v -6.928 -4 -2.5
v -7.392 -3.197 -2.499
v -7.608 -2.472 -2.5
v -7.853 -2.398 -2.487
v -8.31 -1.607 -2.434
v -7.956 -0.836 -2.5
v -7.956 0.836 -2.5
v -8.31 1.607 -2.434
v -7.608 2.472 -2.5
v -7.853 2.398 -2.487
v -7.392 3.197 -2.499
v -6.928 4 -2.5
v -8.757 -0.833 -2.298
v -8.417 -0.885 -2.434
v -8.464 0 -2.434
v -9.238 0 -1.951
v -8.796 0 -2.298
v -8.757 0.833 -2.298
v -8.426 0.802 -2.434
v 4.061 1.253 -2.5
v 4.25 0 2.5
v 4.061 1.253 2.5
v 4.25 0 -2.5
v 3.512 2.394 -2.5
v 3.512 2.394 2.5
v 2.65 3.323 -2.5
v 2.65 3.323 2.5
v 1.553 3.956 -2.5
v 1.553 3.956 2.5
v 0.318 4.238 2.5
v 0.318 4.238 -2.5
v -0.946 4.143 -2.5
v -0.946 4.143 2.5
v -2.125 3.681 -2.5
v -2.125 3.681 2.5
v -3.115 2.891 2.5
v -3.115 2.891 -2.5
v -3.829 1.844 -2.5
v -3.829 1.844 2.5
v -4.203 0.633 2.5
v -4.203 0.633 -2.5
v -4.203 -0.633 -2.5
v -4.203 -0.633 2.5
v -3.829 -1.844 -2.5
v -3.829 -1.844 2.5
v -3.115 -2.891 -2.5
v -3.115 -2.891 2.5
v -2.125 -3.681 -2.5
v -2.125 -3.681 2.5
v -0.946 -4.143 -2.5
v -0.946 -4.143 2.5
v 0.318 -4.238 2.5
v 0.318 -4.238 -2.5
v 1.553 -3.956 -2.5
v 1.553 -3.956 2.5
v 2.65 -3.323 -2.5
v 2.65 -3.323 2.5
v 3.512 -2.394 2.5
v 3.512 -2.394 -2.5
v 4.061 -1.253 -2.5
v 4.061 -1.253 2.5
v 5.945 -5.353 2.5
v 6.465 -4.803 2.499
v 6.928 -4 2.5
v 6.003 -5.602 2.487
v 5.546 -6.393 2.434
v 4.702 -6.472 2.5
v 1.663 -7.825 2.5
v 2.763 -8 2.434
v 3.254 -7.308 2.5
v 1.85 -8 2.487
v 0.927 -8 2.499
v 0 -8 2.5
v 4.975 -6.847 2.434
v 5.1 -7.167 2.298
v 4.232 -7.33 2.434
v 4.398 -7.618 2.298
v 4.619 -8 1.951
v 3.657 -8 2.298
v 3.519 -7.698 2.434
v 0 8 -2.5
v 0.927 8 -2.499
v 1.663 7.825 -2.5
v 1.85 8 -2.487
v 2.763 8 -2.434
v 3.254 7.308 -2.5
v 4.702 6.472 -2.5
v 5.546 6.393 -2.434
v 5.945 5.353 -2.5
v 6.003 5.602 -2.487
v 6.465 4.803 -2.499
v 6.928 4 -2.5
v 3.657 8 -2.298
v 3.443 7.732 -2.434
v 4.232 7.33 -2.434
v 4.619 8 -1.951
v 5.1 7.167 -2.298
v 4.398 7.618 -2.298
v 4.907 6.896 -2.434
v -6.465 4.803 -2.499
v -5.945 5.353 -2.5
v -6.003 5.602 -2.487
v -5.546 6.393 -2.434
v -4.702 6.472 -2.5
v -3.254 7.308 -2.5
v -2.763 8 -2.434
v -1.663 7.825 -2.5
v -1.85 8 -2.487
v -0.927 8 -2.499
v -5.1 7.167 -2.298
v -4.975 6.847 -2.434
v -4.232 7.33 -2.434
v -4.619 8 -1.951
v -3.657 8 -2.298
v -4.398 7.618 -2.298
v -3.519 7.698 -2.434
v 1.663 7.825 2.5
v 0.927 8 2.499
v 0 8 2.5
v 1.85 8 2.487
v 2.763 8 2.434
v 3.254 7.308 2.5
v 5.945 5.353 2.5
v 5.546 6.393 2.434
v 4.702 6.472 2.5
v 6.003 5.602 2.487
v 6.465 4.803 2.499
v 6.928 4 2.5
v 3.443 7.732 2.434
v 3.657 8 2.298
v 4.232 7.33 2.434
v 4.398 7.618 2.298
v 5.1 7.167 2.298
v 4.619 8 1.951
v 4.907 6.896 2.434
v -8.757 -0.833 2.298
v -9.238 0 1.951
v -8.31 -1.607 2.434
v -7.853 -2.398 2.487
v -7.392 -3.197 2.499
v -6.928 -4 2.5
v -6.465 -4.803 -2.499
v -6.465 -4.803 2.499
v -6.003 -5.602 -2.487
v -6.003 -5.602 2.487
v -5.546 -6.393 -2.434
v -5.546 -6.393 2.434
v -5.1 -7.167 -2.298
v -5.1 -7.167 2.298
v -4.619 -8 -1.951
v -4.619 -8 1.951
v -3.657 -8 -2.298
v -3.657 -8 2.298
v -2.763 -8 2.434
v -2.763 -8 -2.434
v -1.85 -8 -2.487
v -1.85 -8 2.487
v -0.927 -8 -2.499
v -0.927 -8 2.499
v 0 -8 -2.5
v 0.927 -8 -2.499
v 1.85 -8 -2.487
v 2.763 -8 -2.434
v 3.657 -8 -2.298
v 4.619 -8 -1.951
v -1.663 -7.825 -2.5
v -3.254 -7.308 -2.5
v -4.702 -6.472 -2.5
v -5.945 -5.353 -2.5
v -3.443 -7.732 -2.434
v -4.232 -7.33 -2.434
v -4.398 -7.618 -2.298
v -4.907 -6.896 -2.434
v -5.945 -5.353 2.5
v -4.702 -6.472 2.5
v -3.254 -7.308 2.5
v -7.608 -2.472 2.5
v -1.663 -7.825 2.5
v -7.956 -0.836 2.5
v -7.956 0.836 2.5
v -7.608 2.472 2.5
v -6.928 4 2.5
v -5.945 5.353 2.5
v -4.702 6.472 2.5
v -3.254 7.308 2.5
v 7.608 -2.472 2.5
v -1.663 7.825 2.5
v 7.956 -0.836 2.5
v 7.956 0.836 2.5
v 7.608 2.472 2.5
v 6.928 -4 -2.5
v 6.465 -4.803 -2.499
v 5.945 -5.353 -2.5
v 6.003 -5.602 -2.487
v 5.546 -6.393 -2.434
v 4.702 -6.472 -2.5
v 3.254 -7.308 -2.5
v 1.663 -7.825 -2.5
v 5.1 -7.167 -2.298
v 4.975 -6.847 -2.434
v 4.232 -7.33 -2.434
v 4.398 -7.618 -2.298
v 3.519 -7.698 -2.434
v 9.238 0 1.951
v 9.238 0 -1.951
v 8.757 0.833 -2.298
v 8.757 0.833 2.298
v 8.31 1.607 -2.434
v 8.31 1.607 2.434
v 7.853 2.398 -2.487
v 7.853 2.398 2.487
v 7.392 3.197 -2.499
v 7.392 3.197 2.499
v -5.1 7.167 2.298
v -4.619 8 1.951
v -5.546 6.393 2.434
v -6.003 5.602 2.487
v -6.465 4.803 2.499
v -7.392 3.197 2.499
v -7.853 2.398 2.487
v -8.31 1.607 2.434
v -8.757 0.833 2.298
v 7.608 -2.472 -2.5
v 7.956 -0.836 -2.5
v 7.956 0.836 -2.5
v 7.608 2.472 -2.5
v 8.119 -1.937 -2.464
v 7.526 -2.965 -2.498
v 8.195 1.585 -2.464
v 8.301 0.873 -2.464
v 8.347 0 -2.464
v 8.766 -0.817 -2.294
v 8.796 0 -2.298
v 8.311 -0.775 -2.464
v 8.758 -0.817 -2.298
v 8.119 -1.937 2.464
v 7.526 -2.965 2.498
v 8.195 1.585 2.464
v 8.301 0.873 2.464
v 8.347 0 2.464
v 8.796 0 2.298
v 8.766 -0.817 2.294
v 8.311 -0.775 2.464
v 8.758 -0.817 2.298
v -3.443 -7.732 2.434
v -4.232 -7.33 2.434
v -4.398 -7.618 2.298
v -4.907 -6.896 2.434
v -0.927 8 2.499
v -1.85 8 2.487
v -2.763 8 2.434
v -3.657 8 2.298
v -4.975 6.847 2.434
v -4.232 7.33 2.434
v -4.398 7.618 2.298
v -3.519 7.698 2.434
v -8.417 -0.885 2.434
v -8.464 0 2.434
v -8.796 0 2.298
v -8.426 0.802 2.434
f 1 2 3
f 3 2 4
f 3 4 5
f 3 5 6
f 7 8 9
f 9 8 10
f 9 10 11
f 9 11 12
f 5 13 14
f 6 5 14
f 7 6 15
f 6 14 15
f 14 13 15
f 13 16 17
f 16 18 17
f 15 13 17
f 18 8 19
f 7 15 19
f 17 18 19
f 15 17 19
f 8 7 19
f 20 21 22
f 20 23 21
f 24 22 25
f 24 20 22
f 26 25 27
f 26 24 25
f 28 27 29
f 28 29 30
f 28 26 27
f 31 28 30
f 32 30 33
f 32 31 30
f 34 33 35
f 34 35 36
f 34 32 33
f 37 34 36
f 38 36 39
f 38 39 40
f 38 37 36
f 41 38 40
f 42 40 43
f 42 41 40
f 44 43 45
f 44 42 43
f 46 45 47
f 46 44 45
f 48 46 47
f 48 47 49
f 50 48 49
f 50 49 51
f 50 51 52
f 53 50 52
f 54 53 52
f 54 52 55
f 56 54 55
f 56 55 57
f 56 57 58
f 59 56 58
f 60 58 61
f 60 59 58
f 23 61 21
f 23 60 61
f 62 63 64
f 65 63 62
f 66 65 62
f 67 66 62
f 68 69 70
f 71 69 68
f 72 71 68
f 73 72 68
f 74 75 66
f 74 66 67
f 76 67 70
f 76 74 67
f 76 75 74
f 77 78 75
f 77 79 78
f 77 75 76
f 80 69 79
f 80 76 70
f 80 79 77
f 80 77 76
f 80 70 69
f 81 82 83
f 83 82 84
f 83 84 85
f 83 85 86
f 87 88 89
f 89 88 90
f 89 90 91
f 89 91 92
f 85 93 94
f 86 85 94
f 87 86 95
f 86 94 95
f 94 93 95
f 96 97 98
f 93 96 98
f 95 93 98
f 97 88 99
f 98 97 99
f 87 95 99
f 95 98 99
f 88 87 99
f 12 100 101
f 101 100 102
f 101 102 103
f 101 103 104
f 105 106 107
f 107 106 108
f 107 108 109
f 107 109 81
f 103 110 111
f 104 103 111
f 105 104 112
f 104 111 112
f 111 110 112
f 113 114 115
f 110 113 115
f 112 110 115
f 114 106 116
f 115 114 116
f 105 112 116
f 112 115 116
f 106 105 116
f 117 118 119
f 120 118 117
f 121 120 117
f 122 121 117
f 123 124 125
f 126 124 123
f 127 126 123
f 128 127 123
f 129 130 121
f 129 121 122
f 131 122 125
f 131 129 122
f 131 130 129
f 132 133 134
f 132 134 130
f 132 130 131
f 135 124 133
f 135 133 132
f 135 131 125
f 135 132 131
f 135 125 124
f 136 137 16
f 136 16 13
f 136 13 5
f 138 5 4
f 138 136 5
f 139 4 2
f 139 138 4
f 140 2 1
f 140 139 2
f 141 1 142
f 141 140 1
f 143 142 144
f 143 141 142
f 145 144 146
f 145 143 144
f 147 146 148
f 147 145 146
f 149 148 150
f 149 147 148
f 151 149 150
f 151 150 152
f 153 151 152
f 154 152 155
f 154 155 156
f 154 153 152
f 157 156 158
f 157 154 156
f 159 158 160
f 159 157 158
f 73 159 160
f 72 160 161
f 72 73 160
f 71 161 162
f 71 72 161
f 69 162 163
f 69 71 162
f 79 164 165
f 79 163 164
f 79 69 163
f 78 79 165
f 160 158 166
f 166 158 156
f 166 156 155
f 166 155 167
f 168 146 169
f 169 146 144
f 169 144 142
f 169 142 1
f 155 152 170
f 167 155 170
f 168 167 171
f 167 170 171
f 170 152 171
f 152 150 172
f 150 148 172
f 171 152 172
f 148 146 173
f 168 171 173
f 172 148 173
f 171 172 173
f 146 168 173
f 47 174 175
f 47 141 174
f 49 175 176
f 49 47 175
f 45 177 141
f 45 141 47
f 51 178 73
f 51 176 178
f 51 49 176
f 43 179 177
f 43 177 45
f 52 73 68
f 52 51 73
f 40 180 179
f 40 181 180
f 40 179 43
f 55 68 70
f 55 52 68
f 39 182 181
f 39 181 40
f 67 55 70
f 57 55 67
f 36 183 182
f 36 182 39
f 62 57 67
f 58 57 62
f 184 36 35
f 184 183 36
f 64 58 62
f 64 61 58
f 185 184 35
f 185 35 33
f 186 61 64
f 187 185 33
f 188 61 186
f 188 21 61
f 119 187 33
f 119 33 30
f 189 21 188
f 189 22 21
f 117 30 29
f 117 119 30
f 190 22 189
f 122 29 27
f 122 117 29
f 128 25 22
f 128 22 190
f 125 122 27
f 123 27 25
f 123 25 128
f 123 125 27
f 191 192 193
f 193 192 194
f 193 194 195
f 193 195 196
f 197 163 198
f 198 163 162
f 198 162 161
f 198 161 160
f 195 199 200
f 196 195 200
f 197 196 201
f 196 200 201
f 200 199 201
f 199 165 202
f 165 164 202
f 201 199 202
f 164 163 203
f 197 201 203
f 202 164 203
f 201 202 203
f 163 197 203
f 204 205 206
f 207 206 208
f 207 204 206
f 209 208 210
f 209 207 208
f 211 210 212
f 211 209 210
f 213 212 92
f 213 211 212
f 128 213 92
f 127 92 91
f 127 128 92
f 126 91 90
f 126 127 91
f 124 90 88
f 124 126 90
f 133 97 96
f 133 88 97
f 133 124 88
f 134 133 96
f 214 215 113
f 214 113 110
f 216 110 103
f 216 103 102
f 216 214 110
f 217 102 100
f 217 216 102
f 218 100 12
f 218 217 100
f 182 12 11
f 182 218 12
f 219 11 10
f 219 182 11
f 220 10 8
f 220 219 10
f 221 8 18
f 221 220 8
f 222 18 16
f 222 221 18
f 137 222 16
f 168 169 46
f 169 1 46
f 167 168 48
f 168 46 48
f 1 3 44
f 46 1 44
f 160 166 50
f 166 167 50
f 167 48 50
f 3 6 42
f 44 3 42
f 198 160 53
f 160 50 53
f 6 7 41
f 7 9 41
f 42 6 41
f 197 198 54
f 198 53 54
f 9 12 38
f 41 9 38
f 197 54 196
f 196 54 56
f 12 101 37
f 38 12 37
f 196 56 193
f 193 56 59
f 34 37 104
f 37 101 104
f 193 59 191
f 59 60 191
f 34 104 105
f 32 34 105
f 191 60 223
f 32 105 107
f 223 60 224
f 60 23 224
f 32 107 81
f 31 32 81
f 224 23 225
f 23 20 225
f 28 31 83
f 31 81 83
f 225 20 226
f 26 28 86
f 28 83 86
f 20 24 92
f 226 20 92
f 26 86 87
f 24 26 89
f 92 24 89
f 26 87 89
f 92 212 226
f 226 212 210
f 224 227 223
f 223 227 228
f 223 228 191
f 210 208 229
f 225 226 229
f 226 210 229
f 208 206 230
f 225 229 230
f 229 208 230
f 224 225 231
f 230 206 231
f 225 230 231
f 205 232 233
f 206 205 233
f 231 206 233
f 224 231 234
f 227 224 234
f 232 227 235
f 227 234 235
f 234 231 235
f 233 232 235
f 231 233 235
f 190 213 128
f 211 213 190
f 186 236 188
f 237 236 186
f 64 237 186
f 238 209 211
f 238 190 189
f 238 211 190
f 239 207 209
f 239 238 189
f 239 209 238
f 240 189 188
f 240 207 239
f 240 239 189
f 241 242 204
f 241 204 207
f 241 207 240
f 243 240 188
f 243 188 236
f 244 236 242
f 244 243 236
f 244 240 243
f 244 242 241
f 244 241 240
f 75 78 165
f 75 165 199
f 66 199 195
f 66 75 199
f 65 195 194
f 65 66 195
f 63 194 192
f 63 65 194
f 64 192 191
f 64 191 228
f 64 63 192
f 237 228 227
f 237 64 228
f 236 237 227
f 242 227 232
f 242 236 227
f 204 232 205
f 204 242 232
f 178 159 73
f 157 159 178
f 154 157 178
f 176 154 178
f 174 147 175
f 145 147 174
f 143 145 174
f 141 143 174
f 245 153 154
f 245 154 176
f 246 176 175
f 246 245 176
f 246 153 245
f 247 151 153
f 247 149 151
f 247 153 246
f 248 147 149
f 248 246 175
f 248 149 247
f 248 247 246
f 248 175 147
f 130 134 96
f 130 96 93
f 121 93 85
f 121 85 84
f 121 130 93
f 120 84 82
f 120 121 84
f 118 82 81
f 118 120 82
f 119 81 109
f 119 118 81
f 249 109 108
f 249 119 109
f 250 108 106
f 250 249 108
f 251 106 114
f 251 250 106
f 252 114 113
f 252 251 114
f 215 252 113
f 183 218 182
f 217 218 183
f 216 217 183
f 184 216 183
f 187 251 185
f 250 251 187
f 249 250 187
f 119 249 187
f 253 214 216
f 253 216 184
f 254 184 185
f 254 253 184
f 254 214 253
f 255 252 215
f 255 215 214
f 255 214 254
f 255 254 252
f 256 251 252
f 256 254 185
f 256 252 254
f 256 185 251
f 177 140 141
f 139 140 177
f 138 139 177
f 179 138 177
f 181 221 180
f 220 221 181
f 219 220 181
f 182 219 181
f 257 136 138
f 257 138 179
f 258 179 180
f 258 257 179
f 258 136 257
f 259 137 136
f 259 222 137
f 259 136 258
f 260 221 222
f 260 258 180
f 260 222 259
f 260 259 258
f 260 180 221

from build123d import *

# Parameters (mm, degrees)
ESQUISSE1_R        = 4.25
BOSS_EXTRU_1_DEPTH = 2.5


with BuildPart() as part:
    # Esquisse1 → Boss.-Extru.1 (new body, symmetric)
    with BuildSketch(Plane.XY):
        Polygon((-4.618802154, -8), (4.618802154, -8), (9.237604307, 0), (4.618802154, 8), (-4.618802154, 8), (-9.237604307, 0), align=None)
        Circle(ESQUISSE1_R, mode=Mode.SUBTRACT)
    extrude(amount=BOSS_EXTRU_1_DEPTH, both=True)

    # Esquisse3 → Enlèvement de matière-Révolution2 (revolve, cut)
    with BuildSketch(Plane(origin=(0, 0, 0), x_dir=(0, 0, -1), z_dir=(1, 0, 0)), mode=Mode.PRIVATE) as enl_vement_de_mati_re_r_volution2_sk:
        with BuildLine():
            Line((3, 10.101429963), (3, 8))
            Line((3, 8), (2.5, 8))
            ThreePointArc((2.5, 8), (2.166714284, 9.000572077), (1.3, 9.601429963))
            Line((1.3, 9.601429963), (1.3, 10.101429963))
            Line((1.3, 10.101429963), (3, 10.101429963))
        make_face()
    enl_vement_de_mati_re_r_volution2 = revolve(enl_vement_de_mati_re_r_volution2_sk.sketch.rotate(Axis((0, 0, 5.617054836), (0, 0, -1)), 90), axis=Axis((0, 0, 5.617054836), (0, 0, -1)), mode=Mode.SUBTRACT)  # turned: the seam where the file's is

    # Symétrie1: Enlèvement de matière-Révolution2 across plane
    add(enl_vement_de_mati_re_r_volution2.mirror(Plane.XY), mode=Mode.SUBTRACT)


solid = part.part
